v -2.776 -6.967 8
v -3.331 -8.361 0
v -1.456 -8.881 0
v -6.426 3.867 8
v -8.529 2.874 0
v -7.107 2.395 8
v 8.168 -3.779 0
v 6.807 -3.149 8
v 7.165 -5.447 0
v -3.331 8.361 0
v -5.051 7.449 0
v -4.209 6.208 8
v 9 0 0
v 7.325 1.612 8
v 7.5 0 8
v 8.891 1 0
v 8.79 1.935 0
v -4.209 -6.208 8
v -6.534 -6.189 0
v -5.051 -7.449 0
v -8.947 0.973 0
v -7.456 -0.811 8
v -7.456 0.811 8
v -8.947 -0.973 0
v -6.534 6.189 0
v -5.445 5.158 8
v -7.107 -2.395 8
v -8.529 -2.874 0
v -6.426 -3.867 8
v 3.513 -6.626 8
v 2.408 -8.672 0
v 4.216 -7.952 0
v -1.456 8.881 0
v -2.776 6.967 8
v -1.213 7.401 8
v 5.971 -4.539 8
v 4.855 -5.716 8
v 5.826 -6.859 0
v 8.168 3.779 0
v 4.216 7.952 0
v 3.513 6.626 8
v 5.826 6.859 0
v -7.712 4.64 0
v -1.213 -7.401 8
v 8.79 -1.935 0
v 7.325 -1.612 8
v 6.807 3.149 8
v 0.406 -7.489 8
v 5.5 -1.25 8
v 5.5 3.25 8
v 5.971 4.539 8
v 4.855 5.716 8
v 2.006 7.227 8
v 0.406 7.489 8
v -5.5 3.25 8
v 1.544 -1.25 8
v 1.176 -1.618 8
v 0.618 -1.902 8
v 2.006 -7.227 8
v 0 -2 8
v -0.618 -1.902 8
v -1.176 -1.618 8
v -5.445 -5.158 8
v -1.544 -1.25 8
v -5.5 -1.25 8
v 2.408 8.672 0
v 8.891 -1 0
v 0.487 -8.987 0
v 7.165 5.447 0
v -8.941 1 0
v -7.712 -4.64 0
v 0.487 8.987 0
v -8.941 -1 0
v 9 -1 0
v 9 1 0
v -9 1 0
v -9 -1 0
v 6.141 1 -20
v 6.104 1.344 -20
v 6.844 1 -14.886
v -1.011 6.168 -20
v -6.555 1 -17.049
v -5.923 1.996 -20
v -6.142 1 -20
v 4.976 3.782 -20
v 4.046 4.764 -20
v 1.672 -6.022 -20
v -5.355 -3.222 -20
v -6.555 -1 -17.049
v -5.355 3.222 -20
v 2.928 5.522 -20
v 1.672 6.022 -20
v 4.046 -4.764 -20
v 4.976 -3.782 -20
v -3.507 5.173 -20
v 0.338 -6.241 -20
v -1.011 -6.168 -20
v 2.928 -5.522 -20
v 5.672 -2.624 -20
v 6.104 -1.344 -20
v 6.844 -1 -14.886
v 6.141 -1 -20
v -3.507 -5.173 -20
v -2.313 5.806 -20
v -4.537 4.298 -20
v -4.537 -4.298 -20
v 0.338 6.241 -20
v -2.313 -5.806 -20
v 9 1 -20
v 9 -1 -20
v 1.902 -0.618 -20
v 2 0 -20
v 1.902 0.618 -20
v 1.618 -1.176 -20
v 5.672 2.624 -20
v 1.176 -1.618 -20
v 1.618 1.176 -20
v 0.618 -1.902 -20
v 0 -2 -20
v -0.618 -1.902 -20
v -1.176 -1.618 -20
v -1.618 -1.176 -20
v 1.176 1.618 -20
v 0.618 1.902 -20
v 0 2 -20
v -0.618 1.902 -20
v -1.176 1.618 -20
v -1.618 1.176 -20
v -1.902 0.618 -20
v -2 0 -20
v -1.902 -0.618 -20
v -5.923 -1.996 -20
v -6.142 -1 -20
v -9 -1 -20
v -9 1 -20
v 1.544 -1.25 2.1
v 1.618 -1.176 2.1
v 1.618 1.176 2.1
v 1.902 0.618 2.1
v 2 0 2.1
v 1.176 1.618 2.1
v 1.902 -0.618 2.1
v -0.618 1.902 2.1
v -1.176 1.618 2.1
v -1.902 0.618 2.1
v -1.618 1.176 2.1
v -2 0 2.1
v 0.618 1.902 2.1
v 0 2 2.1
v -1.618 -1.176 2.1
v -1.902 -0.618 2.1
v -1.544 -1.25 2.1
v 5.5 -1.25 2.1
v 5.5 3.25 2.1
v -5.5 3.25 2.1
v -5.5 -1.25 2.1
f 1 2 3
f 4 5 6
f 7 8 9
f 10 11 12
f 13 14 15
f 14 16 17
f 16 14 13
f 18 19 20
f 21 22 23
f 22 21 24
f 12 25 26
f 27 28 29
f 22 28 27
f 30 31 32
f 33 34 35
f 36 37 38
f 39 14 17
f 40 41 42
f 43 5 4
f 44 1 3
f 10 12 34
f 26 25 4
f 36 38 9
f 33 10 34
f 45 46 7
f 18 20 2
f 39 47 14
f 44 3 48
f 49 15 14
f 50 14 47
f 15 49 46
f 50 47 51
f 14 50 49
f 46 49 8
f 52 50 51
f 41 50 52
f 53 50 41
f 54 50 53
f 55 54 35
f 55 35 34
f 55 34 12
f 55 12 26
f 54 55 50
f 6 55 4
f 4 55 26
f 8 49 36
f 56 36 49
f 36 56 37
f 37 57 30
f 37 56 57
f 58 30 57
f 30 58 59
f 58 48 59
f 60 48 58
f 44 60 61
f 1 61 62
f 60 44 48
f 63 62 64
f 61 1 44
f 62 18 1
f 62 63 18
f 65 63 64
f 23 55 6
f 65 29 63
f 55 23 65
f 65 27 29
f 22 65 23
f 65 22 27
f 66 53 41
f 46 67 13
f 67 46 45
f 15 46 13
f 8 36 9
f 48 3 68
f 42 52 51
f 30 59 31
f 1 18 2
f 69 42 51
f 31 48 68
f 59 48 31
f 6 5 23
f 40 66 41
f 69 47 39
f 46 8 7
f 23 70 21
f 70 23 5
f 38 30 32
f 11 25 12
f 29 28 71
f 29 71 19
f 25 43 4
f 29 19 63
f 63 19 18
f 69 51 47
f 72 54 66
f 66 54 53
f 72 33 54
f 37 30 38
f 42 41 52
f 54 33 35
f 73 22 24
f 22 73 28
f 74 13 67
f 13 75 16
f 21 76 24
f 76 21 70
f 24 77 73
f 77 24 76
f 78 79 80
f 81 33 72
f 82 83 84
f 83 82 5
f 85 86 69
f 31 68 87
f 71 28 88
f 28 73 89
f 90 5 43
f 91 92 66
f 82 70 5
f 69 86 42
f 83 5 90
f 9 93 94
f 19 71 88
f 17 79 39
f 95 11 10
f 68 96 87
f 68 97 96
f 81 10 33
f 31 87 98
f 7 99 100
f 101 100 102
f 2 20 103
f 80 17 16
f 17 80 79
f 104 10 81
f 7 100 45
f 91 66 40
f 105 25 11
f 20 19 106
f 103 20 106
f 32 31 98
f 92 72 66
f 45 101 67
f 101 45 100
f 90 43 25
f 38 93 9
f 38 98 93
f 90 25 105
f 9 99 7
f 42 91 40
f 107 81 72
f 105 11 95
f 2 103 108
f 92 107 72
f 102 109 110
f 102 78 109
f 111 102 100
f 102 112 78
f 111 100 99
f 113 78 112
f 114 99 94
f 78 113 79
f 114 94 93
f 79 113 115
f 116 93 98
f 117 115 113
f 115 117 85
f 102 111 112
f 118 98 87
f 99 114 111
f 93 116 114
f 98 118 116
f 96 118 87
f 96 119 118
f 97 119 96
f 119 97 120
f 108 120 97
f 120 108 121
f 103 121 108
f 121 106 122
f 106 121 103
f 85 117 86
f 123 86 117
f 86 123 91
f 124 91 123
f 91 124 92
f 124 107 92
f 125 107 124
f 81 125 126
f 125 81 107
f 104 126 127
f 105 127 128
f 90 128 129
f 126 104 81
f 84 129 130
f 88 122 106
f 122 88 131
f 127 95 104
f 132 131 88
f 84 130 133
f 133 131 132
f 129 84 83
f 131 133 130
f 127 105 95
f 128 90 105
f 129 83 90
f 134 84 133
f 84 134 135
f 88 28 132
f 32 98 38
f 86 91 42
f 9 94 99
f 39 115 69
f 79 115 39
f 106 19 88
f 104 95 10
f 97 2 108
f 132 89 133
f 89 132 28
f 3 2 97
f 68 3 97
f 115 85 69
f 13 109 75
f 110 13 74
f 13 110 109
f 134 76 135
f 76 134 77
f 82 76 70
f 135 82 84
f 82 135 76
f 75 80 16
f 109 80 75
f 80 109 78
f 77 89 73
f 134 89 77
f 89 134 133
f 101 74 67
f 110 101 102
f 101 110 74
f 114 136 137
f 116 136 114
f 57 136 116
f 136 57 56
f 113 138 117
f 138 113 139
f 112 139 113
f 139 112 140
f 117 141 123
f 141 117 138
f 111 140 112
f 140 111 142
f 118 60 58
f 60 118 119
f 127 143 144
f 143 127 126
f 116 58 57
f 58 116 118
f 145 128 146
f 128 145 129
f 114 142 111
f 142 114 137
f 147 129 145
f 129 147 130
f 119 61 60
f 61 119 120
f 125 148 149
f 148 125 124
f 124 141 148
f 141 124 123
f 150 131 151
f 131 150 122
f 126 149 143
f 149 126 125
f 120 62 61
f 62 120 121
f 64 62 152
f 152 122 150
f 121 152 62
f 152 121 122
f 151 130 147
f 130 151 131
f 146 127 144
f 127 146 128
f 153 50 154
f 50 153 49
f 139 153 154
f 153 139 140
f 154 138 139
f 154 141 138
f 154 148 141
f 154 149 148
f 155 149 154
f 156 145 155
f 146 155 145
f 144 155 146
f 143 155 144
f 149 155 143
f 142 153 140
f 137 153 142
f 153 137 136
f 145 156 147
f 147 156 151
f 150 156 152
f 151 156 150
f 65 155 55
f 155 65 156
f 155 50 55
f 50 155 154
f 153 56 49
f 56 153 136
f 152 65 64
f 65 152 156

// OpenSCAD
wall=2;
sensor_height=4.5;
sensor_sit_depth=6;
sensor_width=11;
handle_size=20;
wire_d=4;

difference() {
    shape_outline();
    // wire hole
    translate([0,0,-handle_size]) cylinder(h=100, d=wire_d, $fn=20);
    // sensor cavity
    translate([-sensor_width/2,1-sensor_height/2,wall+0.1]) cube([sensor_width, sensor_height, sensor_sit_depth]);
}


module shape_outline() {
    cylinder_d=sensor_width+wall*2;
    cone_multiplier = 1.2;
    union() {
        // Inside vent sensor screw-in
        cylinder(d2=cylinder_d, d1=cylinder_d*cone_multiplier, h=sensor_sit_depth+wall);
        // Outside handle body
        translate([0,0,-handle_size]) cylinder(d2=cylinder_d*cone_multiplier, d1=cylinder_d/cone_multiplier, h=handle_size);
        // Twist grip
        translate([-cylinder_d*cone_multiplier/2,-wall/2,-handle_size]) cube([cylinder_d*cone_multiplier, wall, handle_size]);
    }
}
